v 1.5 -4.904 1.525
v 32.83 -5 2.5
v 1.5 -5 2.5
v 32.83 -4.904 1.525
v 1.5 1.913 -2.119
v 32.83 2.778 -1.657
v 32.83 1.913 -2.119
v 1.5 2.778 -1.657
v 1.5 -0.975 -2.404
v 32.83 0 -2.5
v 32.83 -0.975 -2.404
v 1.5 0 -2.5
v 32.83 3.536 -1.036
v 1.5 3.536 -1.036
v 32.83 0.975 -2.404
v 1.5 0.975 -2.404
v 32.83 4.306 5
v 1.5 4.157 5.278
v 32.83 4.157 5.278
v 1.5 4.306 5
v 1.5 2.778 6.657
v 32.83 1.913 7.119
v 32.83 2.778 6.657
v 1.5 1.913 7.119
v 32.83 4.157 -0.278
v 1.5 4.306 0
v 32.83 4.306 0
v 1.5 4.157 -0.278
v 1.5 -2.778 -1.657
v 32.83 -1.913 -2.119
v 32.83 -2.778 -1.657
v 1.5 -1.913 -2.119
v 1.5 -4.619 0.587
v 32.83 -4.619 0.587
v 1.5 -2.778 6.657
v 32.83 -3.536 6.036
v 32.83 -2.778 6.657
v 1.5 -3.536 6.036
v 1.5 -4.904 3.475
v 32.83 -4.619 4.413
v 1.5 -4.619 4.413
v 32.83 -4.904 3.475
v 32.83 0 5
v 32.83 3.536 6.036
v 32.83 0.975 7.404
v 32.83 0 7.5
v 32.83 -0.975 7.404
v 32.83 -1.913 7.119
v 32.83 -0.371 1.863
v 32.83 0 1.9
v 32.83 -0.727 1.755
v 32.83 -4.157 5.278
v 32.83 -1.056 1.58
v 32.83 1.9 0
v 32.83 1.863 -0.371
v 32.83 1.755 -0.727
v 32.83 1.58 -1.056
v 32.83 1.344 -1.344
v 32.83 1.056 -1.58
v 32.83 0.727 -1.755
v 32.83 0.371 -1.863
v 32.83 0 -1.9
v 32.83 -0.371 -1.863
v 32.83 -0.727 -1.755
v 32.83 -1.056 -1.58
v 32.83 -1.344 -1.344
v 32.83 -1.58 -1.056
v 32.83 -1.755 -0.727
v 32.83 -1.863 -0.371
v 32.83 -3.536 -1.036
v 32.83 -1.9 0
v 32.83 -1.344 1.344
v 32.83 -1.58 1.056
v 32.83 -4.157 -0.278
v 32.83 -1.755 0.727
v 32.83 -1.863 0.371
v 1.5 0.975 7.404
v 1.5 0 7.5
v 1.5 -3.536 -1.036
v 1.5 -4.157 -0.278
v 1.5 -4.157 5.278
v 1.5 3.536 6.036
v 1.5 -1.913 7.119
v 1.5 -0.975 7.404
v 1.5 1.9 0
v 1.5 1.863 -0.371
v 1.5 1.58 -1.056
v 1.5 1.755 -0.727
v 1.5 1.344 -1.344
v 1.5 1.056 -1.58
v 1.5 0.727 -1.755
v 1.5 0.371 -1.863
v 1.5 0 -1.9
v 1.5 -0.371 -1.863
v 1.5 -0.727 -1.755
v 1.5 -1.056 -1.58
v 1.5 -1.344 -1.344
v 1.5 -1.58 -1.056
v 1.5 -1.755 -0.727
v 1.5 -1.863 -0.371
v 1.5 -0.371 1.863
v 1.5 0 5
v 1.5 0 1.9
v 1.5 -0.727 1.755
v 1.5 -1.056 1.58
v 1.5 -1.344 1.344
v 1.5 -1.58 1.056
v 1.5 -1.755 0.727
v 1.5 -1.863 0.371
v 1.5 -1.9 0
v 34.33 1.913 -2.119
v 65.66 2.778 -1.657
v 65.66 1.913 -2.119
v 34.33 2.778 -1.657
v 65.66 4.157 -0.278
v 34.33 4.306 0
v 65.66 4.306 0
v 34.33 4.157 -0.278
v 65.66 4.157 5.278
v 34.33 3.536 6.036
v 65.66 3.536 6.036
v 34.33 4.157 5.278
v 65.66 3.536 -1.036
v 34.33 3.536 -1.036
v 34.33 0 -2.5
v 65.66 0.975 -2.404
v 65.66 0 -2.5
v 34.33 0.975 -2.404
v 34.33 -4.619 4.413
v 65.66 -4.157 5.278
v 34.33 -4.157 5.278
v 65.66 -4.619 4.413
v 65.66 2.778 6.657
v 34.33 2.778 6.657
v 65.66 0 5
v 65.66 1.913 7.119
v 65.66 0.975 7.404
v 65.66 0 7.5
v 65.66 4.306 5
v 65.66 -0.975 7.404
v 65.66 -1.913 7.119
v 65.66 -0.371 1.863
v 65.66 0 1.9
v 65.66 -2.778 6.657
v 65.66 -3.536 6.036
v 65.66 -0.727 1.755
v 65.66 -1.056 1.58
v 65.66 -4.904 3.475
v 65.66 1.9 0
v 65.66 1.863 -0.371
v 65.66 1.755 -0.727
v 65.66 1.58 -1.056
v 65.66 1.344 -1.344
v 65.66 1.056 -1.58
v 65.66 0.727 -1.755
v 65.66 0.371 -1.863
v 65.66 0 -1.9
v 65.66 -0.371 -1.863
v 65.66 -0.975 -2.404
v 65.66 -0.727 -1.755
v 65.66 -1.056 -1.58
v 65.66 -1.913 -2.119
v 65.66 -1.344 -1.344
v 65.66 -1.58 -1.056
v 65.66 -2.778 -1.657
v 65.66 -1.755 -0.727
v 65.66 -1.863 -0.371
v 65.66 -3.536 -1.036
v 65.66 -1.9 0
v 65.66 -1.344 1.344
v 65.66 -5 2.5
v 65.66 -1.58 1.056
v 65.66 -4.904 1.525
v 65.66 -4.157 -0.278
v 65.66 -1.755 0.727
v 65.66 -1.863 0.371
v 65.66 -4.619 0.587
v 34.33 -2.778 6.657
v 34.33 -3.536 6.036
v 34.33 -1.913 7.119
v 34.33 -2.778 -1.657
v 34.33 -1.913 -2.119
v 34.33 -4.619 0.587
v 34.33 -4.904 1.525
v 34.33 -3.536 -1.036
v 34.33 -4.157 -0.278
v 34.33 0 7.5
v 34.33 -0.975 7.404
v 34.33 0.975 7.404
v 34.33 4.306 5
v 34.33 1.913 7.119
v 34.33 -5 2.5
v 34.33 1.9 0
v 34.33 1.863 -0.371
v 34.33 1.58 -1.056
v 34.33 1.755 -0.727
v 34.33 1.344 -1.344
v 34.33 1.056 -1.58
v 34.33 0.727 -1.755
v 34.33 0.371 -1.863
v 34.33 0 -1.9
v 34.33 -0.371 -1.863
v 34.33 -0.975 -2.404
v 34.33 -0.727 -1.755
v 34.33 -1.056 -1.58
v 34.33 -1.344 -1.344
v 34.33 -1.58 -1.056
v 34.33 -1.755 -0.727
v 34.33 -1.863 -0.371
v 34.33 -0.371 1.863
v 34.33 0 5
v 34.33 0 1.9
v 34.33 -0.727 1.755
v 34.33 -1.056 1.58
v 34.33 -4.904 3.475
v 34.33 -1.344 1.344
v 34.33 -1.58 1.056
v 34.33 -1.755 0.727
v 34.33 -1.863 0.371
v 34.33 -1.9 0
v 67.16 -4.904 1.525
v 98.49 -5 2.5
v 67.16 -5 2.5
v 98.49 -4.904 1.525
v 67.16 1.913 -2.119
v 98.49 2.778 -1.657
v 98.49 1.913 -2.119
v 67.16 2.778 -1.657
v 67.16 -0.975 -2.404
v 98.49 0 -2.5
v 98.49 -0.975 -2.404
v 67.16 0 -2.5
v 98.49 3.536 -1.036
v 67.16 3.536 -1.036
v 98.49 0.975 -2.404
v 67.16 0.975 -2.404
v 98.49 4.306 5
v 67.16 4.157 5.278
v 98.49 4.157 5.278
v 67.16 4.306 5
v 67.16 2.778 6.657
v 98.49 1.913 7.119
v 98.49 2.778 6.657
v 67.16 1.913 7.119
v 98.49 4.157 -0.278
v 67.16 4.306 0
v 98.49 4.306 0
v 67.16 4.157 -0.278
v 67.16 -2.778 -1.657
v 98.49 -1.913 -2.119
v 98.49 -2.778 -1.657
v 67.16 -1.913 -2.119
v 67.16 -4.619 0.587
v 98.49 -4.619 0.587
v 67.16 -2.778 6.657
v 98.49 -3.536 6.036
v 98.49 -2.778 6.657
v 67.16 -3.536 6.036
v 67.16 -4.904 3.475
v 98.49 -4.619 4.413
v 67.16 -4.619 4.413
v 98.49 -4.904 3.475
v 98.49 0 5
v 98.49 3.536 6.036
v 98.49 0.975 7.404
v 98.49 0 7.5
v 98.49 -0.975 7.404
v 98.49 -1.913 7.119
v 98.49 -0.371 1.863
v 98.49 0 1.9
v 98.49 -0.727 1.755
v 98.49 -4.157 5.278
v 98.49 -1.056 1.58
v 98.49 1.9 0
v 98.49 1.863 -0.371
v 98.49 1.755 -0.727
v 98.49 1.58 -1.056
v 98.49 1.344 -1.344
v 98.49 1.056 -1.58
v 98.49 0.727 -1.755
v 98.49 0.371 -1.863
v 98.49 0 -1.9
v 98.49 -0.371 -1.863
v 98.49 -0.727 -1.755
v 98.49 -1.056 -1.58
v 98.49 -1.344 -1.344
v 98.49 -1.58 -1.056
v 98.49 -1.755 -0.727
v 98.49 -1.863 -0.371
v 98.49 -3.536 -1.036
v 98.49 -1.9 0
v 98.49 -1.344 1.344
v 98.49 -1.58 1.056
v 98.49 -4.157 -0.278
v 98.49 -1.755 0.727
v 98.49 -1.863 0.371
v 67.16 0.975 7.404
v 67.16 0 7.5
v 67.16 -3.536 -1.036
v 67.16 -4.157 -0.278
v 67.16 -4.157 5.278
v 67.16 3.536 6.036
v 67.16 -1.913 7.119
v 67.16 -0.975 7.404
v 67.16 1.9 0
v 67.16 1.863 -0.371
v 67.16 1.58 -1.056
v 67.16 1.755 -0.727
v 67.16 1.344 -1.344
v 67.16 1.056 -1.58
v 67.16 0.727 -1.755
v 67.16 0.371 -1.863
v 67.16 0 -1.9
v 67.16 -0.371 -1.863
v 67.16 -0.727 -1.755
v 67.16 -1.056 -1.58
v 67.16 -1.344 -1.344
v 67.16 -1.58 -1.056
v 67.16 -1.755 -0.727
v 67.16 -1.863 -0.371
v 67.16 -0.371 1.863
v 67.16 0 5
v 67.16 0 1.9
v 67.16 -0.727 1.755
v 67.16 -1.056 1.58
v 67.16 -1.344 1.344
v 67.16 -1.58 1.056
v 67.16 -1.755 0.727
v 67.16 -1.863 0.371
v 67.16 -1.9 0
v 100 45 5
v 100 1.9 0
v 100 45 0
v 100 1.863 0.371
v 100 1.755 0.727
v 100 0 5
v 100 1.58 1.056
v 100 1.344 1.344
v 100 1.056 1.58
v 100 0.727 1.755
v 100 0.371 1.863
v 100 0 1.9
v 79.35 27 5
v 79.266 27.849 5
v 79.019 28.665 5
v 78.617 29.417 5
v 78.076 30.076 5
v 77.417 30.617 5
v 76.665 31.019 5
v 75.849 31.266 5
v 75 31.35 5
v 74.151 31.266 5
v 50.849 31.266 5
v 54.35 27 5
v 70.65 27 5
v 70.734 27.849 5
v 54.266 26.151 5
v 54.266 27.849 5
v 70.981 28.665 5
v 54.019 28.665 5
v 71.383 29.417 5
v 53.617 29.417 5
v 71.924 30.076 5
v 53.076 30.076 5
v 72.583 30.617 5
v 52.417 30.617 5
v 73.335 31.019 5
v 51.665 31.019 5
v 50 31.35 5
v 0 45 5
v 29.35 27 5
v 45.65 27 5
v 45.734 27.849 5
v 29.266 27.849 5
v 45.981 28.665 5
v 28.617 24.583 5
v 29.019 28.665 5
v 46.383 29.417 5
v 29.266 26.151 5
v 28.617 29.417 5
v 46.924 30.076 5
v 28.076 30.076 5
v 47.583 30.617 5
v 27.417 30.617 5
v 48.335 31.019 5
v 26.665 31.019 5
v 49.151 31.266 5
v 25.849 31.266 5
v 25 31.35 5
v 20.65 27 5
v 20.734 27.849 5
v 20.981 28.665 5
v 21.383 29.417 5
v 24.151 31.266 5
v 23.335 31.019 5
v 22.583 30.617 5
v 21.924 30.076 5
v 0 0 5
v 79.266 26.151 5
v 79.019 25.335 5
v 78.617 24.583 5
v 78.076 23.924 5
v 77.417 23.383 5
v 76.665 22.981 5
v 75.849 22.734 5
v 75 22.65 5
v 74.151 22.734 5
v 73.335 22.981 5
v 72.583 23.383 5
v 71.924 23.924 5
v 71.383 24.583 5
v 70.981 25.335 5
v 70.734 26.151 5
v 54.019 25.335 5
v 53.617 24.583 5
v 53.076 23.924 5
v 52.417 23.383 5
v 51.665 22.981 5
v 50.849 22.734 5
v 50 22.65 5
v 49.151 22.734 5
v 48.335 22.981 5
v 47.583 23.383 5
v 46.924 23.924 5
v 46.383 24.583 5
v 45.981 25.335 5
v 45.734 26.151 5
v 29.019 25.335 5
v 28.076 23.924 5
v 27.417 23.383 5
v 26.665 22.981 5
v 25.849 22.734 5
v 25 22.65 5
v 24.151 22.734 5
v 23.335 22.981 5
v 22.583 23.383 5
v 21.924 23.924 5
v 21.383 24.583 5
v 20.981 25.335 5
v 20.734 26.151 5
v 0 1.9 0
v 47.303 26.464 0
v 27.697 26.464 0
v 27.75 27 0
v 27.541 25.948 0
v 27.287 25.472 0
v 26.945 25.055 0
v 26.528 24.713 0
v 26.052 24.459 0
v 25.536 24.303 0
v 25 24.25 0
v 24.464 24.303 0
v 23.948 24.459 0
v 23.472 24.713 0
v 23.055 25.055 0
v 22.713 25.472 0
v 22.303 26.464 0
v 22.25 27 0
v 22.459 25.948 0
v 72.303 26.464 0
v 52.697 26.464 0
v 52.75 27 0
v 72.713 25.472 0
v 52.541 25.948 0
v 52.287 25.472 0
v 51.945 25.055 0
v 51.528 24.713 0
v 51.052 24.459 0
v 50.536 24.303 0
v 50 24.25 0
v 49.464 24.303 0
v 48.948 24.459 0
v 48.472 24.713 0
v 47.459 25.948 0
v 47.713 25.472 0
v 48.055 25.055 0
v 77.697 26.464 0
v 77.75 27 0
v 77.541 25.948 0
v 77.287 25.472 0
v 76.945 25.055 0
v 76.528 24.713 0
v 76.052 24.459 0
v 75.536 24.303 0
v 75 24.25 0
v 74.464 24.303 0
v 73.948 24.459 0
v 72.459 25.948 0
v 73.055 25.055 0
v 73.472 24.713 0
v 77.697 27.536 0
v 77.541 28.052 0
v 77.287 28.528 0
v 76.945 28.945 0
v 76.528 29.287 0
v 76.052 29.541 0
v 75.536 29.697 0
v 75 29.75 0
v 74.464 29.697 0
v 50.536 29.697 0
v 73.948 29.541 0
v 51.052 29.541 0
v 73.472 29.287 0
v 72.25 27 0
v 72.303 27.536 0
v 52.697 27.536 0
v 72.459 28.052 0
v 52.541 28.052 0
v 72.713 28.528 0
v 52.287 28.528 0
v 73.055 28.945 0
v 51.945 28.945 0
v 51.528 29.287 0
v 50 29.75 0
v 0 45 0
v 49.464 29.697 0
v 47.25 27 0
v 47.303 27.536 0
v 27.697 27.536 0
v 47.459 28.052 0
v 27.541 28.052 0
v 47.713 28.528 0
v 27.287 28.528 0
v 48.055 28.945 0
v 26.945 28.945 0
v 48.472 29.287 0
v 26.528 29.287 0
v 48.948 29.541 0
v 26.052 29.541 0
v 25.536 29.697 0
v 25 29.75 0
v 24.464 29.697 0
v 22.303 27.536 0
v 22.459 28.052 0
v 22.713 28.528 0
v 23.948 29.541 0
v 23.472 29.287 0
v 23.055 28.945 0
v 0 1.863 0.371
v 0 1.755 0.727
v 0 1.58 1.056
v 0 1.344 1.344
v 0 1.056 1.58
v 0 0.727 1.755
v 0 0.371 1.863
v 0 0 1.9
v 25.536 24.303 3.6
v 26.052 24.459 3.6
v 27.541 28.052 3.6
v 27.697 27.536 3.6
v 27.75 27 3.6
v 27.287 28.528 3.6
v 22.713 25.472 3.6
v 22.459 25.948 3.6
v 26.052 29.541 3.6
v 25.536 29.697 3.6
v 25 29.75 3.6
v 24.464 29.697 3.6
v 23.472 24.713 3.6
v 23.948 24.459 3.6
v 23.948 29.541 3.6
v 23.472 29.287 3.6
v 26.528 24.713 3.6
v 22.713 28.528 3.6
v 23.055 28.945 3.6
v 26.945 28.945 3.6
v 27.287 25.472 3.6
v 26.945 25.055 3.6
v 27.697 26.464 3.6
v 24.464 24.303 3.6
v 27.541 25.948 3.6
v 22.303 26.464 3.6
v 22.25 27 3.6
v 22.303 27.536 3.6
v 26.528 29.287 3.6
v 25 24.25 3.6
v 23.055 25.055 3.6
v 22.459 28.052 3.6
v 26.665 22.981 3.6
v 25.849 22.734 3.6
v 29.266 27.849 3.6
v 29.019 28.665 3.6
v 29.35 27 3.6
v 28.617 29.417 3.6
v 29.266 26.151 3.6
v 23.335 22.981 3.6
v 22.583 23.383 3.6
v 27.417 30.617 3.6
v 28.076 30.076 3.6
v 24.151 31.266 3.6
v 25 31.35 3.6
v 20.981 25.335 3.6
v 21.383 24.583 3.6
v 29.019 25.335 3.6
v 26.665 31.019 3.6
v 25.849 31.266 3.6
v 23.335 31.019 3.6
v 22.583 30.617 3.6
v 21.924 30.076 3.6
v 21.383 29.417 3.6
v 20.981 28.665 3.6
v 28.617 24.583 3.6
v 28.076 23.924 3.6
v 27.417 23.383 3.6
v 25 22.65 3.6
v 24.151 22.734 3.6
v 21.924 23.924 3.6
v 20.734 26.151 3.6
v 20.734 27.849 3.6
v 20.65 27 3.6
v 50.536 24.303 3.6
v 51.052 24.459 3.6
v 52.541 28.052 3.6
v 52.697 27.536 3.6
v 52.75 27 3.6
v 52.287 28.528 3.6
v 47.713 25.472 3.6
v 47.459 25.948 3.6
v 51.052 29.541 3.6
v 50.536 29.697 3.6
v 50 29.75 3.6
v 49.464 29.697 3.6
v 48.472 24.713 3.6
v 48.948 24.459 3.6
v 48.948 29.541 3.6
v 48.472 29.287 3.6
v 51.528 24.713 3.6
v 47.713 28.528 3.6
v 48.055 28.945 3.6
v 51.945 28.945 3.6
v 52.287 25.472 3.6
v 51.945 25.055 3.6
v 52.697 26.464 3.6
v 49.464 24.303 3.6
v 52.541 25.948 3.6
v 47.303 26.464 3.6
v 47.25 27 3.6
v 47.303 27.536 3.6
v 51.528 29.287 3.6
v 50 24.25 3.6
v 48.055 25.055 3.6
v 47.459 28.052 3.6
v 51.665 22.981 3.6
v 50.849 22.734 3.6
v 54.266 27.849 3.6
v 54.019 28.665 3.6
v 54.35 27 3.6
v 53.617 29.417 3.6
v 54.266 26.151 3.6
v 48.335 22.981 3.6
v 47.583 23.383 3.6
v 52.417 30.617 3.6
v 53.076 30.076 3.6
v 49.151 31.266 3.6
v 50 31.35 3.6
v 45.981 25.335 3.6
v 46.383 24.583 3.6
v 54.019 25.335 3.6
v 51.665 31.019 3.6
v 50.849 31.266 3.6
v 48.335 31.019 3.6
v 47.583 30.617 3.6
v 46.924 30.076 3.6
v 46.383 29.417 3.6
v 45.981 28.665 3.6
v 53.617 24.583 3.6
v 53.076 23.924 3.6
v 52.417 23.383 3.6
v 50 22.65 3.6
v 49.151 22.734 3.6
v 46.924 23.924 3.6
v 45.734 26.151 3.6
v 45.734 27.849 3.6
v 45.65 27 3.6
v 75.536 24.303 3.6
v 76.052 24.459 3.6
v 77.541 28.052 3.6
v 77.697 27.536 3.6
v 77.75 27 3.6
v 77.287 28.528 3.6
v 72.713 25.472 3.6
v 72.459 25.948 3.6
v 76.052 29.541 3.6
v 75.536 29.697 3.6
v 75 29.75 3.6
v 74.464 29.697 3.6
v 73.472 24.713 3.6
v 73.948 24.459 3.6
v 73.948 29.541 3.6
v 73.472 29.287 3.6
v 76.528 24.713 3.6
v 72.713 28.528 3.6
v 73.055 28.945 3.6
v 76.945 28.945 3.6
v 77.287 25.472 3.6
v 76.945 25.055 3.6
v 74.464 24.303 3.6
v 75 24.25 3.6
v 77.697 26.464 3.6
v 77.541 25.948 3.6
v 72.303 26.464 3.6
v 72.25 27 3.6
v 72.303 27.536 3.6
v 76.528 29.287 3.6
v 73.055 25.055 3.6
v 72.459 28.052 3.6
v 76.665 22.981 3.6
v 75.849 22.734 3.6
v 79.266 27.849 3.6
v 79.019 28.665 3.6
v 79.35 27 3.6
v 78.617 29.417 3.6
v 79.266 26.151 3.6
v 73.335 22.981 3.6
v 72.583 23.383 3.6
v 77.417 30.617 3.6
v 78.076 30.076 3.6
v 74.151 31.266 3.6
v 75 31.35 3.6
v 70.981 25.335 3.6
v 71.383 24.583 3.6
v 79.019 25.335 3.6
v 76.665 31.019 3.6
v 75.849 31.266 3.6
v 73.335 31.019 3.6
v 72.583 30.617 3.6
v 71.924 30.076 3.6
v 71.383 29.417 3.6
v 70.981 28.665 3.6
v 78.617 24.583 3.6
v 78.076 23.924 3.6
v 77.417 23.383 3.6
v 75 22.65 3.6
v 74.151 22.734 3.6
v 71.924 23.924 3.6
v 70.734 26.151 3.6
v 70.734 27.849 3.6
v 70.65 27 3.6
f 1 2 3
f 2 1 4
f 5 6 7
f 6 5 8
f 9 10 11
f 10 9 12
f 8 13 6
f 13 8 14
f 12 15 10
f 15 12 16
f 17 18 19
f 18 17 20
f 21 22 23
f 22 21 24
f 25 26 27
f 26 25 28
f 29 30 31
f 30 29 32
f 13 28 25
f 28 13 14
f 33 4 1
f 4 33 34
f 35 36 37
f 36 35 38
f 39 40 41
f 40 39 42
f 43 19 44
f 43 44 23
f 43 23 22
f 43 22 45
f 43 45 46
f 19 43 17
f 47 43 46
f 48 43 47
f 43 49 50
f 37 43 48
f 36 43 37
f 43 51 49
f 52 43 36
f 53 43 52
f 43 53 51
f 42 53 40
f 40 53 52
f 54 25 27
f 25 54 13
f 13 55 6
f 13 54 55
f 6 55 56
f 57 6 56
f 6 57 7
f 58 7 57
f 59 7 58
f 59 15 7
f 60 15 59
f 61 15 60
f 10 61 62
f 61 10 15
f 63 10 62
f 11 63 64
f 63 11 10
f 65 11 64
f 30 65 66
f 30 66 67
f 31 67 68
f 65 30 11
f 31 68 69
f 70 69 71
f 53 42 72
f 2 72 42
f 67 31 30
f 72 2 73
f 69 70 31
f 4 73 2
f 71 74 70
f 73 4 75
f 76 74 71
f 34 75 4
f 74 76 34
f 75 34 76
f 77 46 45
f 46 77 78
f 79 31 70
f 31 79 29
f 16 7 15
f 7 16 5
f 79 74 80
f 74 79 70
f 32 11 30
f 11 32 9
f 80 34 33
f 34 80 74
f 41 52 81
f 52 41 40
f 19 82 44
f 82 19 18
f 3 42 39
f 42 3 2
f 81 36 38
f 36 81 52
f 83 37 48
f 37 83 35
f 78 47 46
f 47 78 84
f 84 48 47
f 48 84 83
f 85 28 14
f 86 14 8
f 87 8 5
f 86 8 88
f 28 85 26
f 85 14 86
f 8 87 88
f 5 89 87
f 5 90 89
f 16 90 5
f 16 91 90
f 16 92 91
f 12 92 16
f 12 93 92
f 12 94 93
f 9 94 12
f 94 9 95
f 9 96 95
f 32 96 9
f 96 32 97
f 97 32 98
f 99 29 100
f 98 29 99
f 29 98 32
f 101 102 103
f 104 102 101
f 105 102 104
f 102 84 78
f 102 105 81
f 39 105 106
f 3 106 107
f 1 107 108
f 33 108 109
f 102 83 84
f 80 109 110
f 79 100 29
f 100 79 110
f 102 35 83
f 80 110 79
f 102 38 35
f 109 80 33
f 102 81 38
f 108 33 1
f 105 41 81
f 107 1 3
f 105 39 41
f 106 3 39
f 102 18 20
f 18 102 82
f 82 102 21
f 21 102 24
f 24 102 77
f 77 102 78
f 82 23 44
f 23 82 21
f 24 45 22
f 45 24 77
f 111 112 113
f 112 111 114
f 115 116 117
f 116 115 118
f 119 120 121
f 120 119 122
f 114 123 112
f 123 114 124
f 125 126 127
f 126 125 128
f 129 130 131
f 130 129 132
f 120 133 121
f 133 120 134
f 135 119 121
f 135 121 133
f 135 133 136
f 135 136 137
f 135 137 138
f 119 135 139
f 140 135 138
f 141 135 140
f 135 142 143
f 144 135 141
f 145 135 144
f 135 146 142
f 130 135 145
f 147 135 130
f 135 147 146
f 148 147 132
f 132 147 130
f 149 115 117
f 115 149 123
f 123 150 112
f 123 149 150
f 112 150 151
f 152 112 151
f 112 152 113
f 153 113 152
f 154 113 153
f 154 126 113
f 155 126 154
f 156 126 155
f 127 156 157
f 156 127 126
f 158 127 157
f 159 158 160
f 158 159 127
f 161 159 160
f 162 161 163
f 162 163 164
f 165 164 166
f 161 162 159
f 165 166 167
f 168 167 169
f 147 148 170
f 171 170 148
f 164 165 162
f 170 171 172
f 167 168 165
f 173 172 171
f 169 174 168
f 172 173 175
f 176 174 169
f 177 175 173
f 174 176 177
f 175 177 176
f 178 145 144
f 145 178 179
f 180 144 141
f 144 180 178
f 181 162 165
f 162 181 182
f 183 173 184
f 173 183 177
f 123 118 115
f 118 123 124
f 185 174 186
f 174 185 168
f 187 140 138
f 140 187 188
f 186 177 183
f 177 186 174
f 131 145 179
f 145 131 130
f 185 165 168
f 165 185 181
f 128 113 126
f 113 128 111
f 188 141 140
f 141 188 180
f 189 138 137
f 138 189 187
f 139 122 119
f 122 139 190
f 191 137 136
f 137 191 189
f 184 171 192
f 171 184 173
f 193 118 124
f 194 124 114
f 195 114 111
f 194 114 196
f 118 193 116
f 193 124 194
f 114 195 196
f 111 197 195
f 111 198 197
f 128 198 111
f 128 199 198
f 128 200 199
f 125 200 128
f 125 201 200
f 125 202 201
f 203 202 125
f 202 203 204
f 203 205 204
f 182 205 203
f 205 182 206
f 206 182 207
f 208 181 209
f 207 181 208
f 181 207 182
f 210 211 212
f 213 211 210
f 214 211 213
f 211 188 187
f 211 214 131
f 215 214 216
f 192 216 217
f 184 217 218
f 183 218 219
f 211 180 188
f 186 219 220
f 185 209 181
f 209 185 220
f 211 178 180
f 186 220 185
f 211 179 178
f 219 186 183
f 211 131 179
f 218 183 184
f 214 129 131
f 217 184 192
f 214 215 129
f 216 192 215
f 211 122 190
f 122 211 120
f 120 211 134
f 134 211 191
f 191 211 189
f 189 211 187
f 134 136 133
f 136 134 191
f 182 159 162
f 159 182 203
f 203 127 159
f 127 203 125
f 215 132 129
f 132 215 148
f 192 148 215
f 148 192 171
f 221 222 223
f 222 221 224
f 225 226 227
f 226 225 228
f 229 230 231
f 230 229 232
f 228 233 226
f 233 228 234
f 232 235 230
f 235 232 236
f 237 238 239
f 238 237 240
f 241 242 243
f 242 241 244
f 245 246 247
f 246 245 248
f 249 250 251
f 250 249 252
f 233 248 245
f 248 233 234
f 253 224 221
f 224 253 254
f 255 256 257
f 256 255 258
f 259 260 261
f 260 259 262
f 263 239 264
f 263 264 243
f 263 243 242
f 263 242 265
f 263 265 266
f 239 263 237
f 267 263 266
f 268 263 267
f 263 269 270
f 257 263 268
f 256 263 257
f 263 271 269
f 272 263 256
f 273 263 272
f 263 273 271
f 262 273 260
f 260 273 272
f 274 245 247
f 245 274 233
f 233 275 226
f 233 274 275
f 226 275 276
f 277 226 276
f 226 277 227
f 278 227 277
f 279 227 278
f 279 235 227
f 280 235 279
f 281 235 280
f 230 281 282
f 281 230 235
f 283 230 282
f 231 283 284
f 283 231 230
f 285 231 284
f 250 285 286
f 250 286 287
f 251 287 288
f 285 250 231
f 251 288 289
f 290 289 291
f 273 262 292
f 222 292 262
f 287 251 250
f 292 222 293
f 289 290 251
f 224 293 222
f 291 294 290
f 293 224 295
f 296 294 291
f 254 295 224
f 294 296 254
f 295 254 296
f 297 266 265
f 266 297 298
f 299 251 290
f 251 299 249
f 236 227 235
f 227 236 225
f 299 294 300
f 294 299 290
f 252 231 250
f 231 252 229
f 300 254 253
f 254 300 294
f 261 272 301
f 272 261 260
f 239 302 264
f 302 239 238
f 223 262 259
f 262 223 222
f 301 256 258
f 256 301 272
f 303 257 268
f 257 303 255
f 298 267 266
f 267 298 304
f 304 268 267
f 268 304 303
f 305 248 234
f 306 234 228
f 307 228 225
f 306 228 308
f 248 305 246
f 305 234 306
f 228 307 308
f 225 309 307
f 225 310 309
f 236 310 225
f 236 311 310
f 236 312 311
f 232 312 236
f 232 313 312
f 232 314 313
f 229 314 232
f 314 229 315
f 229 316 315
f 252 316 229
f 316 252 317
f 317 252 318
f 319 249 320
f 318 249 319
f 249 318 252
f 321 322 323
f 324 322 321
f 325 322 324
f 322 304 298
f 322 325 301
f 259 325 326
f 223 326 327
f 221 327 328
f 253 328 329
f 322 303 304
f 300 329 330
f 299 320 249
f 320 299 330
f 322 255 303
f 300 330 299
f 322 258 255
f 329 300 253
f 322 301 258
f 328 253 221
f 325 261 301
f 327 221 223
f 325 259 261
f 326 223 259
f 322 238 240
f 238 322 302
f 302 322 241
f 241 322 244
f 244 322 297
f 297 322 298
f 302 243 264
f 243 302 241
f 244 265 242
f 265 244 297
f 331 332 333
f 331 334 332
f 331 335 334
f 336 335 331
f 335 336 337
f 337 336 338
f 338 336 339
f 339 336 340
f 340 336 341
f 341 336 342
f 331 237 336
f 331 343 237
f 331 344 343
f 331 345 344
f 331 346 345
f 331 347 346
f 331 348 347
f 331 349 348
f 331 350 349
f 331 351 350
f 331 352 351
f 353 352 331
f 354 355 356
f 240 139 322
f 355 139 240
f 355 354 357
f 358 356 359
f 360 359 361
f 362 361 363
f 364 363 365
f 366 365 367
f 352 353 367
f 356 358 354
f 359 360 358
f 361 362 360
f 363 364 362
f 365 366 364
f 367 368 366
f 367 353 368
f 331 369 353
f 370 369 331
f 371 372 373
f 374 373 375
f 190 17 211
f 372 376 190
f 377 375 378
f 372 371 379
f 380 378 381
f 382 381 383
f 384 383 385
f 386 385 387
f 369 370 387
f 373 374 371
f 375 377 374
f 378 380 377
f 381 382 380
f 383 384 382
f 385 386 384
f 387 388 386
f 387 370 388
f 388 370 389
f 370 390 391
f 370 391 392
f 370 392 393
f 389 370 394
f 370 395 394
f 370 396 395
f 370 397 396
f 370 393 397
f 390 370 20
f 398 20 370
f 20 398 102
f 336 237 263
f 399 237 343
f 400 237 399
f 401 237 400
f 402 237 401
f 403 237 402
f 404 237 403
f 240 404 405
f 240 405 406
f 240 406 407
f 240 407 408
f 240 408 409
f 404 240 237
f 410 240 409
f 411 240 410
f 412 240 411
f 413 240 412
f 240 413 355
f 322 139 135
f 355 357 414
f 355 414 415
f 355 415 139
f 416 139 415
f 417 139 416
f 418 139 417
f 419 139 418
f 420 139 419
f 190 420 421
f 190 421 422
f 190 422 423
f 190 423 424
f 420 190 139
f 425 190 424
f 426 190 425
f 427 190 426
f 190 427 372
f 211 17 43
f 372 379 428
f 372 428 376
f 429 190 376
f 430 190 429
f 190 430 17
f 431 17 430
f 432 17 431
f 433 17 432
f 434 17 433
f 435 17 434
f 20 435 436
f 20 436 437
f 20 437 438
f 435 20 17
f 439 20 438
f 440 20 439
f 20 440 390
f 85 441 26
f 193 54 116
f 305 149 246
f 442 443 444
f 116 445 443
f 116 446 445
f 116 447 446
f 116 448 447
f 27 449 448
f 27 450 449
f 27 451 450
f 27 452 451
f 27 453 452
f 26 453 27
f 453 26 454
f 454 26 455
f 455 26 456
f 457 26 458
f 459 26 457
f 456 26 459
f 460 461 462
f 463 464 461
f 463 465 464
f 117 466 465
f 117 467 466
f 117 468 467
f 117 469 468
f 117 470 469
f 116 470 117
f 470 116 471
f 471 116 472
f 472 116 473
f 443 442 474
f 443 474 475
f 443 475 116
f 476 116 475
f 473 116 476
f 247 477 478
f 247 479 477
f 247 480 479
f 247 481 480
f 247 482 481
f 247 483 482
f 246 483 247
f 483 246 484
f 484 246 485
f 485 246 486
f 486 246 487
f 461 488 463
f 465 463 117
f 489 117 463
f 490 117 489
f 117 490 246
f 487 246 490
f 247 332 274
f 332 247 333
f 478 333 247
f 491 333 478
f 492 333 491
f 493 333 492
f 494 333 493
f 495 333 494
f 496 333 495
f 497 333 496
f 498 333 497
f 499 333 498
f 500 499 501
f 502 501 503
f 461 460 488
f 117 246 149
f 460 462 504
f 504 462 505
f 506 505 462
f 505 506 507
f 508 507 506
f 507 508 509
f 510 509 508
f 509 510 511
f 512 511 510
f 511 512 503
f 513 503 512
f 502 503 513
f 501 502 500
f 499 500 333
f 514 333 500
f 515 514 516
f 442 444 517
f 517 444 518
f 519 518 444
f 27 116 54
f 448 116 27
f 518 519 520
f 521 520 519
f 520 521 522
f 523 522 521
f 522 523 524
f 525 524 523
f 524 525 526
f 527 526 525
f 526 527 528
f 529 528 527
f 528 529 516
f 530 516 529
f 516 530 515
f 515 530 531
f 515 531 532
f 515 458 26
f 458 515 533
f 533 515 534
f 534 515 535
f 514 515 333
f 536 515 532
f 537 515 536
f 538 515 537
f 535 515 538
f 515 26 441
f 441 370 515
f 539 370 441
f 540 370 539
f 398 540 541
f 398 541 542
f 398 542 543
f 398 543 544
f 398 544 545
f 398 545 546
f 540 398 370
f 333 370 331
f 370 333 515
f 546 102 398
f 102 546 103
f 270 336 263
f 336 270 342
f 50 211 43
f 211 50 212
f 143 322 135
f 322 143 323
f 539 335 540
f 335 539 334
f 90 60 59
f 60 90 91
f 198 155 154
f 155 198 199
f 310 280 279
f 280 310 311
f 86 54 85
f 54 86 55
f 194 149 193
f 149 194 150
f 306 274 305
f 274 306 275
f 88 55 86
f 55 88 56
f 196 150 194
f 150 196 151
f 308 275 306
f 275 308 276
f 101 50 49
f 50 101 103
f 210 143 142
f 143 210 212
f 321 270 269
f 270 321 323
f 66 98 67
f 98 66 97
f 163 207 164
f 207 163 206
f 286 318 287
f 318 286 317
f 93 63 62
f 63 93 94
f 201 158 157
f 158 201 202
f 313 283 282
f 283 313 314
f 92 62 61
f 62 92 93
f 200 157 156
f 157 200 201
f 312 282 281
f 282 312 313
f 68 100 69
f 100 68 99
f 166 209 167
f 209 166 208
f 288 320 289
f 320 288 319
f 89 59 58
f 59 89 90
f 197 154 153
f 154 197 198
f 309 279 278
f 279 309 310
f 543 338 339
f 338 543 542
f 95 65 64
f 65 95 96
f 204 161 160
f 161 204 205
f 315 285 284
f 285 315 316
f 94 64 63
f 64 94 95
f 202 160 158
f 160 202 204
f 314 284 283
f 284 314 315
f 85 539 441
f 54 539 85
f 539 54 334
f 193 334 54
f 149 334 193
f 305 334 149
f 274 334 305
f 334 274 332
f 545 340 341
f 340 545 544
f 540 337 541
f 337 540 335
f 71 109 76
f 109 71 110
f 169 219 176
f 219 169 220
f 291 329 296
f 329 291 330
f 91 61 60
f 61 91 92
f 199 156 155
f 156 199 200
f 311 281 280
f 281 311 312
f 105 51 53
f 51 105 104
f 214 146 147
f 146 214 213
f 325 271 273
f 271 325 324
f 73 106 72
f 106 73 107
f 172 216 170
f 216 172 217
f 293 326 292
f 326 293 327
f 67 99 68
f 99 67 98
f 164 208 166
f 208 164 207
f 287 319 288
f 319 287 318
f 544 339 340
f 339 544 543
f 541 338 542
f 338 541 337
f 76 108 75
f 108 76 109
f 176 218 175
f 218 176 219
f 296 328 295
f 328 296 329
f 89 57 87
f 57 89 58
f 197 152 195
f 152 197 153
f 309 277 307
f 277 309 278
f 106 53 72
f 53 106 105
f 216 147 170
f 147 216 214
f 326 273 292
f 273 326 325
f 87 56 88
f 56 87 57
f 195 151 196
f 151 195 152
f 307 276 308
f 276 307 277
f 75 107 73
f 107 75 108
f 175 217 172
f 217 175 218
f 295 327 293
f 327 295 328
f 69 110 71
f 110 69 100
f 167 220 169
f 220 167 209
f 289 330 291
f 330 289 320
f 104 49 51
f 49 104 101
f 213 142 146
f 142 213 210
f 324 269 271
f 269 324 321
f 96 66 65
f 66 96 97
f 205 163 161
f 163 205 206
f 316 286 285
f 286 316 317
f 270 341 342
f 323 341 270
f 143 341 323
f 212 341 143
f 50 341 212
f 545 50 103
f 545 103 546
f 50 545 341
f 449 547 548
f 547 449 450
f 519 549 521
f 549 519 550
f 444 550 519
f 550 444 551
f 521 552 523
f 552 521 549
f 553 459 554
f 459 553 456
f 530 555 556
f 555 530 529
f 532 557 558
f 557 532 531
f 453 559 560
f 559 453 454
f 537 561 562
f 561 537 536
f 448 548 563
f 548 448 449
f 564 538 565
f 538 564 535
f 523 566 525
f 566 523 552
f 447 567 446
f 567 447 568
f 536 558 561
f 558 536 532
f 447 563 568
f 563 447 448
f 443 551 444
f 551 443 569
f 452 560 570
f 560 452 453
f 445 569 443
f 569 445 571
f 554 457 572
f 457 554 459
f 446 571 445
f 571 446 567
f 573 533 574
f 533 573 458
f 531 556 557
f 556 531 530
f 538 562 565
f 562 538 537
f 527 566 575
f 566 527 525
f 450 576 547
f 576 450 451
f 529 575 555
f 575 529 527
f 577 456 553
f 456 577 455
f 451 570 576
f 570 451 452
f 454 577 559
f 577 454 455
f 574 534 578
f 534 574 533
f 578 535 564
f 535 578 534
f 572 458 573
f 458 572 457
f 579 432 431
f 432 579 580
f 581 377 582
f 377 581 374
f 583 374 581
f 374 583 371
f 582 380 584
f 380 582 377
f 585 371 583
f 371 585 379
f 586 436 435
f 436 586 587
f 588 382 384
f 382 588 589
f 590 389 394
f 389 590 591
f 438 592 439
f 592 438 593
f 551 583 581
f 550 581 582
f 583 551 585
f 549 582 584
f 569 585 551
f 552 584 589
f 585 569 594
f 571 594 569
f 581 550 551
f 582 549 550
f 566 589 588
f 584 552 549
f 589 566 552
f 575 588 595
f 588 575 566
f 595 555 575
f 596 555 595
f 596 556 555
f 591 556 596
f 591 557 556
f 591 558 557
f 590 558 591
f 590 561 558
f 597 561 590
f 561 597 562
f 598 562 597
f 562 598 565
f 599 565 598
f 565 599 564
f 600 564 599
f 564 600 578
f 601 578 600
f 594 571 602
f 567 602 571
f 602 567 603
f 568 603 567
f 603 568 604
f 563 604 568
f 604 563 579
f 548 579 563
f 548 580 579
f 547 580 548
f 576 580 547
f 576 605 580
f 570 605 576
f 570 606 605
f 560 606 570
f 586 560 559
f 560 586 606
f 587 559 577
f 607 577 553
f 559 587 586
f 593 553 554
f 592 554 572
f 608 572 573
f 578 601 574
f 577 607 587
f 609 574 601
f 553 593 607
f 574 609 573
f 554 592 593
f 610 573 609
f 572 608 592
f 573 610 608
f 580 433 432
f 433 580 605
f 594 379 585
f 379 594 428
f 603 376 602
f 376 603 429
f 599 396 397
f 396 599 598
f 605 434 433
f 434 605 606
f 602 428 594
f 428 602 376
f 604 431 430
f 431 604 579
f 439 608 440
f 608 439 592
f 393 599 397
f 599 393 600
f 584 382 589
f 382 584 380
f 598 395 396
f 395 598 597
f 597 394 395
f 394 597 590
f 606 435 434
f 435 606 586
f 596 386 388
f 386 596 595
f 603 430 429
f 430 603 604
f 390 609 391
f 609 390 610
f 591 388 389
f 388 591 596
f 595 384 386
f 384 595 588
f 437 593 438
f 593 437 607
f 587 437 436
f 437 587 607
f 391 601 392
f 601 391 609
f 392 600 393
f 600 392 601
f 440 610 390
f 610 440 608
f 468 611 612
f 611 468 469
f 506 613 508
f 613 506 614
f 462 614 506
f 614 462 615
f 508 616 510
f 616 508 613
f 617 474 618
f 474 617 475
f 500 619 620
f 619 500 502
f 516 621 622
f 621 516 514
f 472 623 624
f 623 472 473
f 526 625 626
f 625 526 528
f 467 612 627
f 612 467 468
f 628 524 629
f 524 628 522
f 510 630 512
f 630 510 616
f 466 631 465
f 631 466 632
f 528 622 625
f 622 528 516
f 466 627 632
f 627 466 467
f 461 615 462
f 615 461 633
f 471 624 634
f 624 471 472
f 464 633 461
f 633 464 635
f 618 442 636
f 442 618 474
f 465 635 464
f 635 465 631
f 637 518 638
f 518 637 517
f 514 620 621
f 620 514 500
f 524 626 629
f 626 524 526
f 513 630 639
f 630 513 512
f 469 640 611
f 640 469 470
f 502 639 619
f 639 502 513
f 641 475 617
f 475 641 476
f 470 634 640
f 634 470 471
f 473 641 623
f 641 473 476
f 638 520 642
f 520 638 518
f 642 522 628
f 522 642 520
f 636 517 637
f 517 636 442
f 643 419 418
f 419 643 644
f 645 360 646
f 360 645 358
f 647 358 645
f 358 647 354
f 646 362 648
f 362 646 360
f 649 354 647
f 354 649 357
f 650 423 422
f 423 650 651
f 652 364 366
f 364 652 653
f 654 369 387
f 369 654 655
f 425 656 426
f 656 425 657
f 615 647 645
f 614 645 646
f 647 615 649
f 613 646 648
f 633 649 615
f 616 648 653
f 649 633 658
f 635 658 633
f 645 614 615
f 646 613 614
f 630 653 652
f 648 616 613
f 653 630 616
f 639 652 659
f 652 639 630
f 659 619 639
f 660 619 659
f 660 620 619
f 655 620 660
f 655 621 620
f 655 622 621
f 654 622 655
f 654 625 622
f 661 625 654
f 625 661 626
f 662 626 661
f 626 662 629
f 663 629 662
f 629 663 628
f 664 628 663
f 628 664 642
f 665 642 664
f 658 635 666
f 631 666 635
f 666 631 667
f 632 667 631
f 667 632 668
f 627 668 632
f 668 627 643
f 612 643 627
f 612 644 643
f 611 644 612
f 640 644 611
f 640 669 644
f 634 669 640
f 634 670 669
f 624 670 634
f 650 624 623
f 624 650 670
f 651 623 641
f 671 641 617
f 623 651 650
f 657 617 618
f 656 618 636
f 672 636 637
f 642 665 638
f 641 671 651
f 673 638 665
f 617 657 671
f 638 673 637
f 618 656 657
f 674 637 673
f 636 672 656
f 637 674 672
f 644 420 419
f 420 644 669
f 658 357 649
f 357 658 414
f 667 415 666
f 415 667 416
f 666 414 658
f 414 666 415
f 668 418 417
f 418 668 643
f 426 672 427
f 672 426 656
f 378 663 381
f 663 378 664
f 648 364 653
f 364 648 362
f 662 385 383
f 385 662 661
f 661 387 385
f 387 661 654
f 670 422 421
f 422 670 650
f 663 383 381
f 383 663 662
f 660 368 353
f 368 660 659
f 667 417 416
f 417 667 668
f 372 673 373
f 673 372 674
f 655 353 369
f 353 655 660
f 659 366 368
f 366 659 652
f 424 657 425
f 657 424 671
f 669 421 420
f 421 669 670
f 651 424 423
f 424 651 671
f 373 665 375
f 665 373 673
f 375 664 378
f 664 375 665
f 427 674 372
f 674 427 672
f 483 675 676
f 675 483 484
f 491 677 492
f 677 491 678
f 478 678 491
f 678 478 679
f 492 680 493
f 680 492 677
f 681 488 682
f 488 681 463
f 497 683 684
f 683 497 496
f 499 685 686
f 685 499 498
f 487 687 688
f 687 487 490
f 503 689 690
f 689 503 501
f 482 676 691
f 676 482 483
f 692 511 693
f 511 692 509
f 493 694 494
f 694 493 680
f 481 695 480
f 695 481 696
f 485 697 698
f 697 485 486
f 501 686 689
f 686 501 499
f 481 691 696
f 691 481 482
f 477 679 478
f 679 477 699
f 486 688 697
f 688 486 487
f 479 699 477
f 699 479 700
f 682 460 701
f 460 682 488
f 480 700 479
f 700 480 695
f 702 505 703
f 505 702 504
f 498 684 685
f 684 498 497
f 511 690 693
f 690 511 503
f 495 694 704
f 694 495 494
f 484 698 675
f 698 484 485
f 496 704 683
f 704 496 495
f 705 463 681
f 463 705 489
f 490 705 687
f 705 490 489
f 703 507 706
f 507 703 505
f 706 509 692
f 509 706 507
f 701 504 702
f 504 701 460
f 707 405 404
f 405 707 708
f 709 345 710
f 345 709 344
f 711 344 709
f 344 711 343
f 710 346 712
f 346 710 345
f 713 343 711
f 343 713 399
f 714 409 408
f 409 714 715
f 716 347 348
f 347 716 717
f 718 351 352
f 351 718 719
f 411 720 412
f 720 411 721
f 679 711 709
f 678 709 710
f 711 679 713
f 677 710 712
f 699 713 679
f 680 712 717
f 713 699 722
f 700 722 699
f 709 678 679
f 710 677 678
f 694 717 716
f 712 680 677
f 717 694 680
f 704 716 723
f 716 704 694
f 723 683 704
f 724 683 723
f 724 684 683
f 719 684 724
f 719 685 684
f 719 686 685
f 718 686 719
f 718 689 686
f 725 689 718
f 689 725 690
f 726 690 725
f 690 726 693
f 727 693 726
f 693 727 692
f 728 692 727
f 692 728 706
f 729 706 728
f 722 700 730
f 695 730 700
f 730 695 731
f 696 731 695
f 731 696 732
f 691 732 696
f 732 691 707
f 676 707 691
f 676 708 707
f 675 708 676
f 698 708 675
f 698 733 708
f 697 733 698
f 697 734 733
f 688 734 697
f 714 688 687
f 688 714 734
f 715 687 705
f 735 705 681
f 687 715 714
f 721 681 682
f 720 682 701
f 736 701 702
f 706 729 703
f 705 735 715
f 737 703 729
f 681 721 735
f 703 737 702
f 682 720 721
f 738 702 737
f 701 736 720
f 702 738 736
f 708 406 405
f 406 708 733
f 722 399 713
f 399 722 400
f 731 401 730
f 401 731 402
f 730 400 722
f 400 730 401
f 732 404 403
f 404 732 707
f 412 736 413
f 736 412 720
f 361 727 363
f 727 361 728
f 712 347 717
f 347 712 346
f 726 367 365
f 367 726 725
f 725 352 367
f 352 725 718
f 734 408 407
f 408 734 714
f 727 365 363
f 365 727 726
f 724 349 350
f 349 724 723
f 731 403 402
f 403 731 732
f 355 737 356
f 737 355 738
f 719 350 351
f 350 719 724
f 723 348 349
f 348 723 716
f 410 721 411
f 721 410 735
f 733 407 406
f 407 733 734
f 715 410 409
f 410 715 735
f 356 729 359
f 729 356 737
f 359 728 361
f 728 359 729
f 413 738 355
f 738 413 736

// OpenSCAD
$fn = 32;

// ----------------------------------------------------------------------
// Hinge leaf: 100 x 50 x 10 mm
// ----------------------------------------------------------------------

// --- parameters (mm) ---
tab_len = 100;            // leaf length, X
tab_w = 45;               // leaf width, Y
tab_t = 5;                // leaf thickness
ring_d = 10;              // knuckle diameter
ring_w = 31.33;           // knuckle width
knuckle_n = 3;            // number of knuckles
pin_d = 3.8;              // pin bore
gap = 1.5;                // gap between the knuckles
screw_d = 5.5;            // screw clearance
cs_d = 8.7;               // countersink diameter
cs_h = 1.4;               // countersink depth

module leaf() {
  cube([tab_len, tab_w, tab_t]);
}

module knuckles() {
  /* barrels sit on the leaf edge, the pin axis at half the leaf thickness */
  for (i = [0 : knuckle_n - 1])
    translate([gap + i * (ring_w + gap), 0, tab_t * 0.5])
      rotate([0, 90, 0]) cylinder(h = ring_w, d = ring_d);
}

difference() {
  union() {
    leaf();
    knuckles();
  }
  rotate([0, 90, 0]) translate([0, 0, -1])
    cylinder(h = tab_len + 2, d = pin_d);
  translate([25, tab_w * 0.6, -1]) cylinder(h = tab_t + 2, d = screw_d);
  translate([25, tab_w * 0.6, tab_t - cs_h]) cylinder(h = cs_h + 0.5, d = cs_d);
  translate([50, tab_w * 0.6, -1]) cylinder(h = tab_t + 2, d = screw_d);
  translate([50, tab_w * 0.6, tab_t - cs_h]) cylinder(h = cs_h + 0.5, d = cs_d);
  translate([75, tab_w * 0.6, -1]) cylinder(h = tab_t + 2, d = screw_d);
  translate([75, tab_w * 0.6, tab_t - cs_h]) cylinder(h = cs_h + 0.5, d = cs_d);
}
